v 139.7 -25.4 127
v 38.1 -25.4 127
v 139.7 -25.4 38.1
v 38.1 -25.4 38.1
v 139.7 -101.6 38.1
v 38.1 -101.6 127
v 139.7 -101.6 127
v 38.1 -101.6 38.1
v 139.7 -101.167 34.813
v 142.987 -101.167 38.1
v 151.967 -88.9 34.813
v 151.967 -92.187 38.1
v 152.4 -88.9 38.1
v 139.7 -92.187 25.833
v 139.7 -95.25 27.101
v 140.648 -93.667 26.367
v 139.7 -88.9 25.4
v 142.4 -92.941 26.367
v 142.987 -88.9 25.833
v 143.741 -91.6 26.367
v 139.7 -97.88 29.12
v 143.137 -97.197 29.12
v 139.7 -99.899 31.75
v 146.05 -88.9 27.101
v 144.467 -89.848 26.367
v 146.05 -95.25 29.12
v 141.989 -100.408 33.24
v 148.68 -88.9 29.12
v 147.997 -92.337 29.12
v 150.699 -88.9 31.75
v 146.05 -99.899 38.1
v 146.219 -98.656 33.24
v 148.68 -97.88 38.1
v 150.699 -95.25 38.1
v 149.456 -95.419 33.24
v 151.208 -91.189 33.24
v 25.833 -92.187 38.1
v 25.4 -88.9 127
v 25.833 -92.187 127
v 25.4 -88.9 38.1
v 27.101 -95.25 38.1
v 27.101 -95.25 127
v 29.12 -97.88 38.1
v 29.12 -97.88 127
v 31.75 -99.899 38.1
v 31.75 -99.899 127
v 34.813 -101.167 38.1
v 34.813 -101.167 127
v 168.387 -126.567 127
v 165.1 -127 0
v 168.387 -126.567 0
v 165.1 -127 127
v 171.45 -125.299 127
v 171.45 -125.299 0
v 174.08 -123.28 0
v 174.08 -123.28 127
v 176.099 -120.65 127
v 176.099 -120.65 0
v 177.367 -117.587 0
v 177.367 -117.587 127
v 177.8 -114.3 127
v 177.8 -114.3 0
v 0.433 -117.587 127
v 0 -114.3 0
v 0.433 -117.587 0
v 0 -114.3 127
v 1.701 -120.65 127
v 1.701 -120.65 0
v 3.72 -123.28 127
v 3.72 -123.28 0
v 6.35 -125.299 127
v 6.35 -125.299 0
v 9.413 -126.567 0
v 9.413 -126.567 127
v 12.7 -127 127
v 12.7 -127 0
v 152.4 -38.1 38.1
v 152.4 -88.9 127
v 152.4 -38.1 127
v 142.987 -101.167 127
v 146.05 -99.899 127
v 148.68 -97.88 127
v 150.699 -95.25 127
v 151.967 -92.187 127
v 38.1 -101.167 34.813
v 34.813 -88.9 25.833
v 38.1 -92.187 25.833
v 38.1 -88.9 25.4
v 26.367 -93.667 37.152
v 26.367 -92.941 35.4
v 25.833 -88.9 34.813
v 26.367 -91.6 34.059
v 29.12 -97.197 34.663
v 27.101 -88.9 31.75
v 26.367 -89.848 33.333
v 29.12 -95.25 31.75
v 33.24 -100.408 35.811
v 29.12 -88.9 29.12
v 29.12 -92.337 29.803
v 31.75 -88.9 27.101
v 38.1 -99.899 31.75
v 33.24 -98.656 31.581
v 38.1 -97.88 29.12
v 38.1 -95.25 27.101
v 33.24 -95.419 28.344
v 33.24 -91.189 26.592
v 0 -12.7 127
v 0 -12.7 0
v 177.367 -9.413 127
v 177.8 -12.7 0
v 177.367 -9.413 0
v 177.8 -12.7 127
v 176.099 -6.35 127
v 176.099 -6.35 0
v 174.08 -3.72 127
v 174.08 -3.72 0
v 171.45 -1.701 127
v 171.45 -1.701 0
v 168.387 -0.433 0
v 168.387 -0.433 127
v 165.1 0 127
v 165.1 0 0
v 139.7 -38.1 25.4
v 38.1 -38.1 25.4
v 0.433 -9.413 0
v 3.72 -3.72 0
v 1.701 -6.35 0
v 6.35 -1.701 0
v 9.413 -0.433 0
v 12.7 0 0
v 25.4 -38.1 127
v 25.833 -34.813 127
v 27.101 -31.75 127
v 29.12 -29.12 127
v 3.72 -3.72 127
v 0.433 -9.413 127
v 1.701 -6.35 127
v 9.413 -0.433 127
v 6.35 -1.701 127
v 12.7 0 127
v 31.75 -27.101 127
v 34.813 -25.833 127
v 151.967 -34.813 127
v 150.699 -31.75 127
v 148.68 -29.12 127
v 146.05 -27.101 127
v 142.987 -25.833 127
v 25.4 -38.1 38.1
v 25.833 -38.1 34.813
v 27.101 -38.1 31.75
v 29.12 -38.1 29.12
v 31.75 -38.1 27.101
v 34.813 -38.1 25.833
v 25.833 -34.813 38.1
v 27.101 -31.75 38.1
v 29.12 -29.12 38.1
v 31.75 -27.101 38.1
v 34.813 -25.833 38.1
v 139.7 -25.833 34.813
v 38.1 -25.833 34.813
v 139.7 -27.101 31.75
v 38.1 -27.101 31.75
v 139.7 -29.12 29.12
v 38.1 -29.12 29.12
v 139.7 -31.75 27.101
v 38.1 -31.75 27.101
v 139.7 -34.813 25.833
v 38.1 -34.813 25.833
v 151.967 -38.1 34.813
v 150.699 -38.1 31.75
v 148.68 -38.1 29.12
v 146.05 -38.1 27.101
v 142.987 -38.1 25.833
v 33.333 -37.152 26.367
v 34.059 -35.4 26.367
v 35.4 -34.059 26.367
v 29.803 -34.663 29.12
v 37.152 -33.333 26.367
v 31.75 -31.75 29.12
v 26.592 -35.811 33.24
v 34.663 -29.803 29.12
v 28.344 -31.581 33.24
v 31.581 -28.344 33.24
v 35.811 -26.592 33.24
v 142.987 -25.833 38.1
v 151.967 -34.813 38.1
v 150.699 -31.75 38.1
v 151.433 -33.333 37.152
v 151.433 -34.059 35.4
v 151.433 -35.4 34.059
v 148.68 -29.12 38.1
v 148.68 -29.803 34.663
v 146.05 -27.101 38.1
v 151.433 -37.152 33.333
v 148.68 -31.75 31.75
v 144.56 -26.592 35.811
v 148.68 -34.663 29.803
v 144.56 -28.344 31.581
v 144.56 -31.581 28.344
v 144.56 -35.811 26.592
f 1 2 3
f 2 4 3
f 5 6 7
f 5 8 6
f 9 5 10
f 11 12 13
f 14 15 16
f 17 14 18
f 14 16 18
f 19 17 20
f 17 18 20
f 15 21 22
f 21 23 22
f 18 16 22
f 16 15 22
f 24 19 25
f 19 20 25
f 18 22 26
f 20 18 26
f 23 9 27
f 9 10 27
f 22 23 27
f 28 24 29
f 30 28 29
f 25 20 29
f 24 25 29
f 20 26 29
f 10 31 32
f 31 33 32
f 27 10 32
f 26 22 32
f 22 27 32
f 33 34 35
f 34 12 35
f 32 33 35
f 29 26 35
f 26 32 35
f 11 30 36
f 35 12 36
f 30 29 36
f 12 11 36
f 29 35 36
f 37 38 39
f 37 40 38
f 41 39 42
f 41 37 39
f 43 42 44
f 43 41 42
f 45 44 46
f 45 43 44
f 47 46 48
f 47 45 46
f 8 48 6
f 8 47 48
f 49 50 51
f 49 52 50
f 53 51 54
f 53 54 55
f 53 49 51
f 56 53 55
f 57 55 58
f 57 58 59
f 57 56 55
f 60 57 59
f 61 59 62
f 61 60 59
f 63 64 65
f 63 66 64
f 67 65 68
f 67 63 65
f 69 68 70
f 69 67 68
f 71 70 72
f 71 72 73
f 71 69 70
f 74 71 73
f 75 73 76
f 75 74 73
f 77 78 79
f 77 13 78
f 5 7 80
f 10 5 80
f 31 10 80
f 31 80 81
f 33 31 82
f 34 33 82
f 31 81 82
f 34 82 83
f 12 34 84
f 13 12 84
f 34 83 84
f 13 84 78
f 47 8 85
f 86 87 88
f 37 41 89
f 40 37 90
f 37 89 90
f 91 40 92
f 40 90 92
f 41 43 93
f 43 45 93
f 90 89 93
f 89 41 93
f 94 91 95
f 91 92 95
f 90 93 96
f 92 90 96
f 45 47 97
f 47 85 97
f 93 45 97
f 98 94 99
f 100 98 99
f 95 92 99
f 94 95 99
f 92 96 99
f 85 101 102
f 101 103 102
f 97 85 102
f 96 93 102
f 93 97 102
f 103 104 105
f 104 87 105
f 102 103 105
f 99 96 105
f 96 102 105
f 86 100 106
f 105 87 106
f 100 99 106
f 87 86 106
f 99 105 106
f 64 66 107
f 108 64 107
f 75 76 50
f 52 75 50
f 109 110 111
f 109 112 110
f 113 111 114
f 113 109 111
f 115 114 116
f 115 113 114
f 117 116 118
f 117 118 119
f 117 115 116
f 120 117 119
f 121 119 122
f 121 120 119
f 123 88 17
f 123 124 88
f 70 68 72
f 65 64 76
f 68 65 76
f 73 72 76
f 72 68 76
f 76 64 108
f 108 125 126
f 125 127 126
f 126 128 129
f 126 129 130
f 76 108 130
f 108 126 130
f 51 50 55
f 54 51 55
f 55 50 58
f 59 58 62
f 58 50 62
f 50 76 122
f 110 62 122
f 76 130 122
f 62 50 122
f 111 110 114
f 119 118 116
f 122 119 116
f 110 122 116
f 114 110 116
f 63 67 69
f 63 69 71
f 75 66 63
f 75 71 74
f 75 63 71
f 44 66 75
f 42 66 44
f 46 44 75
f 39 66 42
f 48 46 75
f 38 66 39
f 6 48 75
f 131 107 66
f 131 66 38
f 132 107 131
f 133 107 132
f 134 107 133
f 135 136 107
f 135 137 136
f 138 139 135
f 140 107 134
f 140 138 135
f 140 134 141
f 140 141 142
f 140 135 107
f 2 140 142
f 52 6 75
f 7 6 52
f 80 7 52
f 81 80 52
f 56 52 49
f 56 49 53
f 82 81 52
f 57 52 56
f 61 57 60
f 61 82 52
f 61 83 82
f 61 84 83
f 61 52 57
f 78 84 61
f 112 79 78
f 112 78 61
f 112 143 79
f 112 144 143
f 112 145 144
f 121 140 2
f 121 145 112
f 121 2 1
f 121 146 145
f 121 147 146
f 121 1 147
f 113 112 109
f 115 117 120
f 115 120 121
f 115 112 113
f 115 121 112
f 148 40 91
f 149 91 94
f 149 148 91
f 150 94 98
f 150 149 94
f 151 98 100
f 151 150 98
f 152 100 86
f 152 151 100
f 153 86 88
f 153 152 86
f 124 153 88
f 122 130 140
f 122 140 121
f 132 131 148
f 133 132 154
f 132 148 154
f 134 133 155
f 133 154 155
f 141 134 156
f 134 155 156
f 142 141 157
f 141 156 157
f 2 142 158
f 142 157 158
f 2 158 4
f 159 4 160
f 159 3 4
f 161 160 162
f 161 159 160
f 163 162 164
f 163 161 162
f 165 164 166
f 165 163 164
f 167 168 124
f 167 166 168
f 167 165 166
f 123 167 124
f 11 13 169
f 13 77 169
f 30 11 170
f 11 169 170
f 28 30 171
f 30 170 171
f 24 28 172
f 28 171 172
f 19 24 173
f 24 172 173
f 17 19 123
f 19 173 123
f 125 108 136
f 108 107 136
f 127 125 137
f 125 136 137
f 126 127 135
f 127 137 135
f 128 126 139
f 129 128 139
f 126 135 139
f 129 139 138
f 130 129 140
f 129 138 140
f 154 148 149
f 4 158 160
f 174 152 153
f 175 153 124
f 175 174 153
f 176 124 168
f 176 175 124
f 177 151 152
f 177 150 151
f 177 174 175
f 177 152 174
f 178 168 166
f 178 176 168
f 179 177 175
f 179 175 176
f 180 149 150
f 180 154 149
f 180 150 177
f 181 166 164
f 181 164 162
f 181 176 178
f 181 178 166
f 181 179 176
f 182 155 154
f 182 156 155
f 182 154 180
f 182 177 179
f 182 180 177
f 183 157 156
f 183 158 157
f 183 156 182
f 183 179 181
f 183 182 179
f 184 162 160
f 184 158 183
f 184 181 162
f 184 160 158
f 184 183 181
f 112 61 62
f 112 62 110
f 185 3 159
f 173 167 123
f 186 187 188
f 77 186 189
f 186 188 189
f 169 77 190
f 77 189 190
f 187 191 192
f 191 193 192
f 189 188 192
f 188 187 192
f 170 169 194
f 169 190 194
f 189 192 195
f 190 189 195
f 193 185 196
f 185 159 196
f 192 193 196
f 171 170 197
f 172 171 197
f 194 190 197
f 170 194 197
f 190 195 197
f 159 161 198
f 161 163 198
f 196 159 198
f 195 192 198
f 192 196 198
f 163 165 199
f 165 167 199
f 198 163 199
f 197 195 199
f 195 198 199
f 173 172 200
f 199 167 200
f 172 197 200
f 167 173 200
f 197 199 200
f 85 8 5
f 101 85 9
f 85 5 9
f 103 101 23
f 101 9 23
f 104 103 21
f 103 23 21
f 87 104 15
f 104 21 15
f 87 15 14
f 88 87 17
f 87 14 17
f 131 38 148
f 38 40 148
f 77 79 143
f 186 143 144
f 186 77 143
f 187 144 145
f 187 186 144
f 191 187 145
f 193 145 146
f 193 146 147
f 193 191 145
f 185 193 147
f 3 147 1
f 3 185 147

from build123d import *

# Parameters (mm, degrees)
F0_W     = 177.8
F0_H     = 127
F1_DEPTH = 127
F2_T     = -25.4
F3_R     = 12.7


with BuildPart() as f1:
    # F0 (on Top) → F1 (new body)
    with BuildSketch(Plane.XY):
        with Locations((88.9, -63.5)):
            Rectangle(F0_W, F0_H)
    extrude(amount=F1_DEPTH)

    # F2
    f2_openings = [f1.faces().sort_by_distance(p)[0] for p in [
        (88.9, -63.5, 127),
    ]]
    offset(amount=F2_T, openings=f2_openings)

    # F3
    f3_edges = [f1.edges().sort_by_distance(p)[0] for p in [
        (152.4, -101.6, 76.2),
        (88.9, -101.6, 25.4),
        (25.4, -101.6, 76.2),
        (25.4, -25.4, 76.2),
        (25.4, -63.5, 25.4),
        (88.9, -25.4, 25.4),
        (152.4, -25.4, 76.2),
        (152.4, -63.5, 25.4),
        (177.8, 0, 63.5),
        (177.8, -127, 63.5),
        (0, -127, 63.5),
        (0, 0, 63.5),
    ]]
    fillet(f3_edges, radius=F3_R)


solid = f1.part
